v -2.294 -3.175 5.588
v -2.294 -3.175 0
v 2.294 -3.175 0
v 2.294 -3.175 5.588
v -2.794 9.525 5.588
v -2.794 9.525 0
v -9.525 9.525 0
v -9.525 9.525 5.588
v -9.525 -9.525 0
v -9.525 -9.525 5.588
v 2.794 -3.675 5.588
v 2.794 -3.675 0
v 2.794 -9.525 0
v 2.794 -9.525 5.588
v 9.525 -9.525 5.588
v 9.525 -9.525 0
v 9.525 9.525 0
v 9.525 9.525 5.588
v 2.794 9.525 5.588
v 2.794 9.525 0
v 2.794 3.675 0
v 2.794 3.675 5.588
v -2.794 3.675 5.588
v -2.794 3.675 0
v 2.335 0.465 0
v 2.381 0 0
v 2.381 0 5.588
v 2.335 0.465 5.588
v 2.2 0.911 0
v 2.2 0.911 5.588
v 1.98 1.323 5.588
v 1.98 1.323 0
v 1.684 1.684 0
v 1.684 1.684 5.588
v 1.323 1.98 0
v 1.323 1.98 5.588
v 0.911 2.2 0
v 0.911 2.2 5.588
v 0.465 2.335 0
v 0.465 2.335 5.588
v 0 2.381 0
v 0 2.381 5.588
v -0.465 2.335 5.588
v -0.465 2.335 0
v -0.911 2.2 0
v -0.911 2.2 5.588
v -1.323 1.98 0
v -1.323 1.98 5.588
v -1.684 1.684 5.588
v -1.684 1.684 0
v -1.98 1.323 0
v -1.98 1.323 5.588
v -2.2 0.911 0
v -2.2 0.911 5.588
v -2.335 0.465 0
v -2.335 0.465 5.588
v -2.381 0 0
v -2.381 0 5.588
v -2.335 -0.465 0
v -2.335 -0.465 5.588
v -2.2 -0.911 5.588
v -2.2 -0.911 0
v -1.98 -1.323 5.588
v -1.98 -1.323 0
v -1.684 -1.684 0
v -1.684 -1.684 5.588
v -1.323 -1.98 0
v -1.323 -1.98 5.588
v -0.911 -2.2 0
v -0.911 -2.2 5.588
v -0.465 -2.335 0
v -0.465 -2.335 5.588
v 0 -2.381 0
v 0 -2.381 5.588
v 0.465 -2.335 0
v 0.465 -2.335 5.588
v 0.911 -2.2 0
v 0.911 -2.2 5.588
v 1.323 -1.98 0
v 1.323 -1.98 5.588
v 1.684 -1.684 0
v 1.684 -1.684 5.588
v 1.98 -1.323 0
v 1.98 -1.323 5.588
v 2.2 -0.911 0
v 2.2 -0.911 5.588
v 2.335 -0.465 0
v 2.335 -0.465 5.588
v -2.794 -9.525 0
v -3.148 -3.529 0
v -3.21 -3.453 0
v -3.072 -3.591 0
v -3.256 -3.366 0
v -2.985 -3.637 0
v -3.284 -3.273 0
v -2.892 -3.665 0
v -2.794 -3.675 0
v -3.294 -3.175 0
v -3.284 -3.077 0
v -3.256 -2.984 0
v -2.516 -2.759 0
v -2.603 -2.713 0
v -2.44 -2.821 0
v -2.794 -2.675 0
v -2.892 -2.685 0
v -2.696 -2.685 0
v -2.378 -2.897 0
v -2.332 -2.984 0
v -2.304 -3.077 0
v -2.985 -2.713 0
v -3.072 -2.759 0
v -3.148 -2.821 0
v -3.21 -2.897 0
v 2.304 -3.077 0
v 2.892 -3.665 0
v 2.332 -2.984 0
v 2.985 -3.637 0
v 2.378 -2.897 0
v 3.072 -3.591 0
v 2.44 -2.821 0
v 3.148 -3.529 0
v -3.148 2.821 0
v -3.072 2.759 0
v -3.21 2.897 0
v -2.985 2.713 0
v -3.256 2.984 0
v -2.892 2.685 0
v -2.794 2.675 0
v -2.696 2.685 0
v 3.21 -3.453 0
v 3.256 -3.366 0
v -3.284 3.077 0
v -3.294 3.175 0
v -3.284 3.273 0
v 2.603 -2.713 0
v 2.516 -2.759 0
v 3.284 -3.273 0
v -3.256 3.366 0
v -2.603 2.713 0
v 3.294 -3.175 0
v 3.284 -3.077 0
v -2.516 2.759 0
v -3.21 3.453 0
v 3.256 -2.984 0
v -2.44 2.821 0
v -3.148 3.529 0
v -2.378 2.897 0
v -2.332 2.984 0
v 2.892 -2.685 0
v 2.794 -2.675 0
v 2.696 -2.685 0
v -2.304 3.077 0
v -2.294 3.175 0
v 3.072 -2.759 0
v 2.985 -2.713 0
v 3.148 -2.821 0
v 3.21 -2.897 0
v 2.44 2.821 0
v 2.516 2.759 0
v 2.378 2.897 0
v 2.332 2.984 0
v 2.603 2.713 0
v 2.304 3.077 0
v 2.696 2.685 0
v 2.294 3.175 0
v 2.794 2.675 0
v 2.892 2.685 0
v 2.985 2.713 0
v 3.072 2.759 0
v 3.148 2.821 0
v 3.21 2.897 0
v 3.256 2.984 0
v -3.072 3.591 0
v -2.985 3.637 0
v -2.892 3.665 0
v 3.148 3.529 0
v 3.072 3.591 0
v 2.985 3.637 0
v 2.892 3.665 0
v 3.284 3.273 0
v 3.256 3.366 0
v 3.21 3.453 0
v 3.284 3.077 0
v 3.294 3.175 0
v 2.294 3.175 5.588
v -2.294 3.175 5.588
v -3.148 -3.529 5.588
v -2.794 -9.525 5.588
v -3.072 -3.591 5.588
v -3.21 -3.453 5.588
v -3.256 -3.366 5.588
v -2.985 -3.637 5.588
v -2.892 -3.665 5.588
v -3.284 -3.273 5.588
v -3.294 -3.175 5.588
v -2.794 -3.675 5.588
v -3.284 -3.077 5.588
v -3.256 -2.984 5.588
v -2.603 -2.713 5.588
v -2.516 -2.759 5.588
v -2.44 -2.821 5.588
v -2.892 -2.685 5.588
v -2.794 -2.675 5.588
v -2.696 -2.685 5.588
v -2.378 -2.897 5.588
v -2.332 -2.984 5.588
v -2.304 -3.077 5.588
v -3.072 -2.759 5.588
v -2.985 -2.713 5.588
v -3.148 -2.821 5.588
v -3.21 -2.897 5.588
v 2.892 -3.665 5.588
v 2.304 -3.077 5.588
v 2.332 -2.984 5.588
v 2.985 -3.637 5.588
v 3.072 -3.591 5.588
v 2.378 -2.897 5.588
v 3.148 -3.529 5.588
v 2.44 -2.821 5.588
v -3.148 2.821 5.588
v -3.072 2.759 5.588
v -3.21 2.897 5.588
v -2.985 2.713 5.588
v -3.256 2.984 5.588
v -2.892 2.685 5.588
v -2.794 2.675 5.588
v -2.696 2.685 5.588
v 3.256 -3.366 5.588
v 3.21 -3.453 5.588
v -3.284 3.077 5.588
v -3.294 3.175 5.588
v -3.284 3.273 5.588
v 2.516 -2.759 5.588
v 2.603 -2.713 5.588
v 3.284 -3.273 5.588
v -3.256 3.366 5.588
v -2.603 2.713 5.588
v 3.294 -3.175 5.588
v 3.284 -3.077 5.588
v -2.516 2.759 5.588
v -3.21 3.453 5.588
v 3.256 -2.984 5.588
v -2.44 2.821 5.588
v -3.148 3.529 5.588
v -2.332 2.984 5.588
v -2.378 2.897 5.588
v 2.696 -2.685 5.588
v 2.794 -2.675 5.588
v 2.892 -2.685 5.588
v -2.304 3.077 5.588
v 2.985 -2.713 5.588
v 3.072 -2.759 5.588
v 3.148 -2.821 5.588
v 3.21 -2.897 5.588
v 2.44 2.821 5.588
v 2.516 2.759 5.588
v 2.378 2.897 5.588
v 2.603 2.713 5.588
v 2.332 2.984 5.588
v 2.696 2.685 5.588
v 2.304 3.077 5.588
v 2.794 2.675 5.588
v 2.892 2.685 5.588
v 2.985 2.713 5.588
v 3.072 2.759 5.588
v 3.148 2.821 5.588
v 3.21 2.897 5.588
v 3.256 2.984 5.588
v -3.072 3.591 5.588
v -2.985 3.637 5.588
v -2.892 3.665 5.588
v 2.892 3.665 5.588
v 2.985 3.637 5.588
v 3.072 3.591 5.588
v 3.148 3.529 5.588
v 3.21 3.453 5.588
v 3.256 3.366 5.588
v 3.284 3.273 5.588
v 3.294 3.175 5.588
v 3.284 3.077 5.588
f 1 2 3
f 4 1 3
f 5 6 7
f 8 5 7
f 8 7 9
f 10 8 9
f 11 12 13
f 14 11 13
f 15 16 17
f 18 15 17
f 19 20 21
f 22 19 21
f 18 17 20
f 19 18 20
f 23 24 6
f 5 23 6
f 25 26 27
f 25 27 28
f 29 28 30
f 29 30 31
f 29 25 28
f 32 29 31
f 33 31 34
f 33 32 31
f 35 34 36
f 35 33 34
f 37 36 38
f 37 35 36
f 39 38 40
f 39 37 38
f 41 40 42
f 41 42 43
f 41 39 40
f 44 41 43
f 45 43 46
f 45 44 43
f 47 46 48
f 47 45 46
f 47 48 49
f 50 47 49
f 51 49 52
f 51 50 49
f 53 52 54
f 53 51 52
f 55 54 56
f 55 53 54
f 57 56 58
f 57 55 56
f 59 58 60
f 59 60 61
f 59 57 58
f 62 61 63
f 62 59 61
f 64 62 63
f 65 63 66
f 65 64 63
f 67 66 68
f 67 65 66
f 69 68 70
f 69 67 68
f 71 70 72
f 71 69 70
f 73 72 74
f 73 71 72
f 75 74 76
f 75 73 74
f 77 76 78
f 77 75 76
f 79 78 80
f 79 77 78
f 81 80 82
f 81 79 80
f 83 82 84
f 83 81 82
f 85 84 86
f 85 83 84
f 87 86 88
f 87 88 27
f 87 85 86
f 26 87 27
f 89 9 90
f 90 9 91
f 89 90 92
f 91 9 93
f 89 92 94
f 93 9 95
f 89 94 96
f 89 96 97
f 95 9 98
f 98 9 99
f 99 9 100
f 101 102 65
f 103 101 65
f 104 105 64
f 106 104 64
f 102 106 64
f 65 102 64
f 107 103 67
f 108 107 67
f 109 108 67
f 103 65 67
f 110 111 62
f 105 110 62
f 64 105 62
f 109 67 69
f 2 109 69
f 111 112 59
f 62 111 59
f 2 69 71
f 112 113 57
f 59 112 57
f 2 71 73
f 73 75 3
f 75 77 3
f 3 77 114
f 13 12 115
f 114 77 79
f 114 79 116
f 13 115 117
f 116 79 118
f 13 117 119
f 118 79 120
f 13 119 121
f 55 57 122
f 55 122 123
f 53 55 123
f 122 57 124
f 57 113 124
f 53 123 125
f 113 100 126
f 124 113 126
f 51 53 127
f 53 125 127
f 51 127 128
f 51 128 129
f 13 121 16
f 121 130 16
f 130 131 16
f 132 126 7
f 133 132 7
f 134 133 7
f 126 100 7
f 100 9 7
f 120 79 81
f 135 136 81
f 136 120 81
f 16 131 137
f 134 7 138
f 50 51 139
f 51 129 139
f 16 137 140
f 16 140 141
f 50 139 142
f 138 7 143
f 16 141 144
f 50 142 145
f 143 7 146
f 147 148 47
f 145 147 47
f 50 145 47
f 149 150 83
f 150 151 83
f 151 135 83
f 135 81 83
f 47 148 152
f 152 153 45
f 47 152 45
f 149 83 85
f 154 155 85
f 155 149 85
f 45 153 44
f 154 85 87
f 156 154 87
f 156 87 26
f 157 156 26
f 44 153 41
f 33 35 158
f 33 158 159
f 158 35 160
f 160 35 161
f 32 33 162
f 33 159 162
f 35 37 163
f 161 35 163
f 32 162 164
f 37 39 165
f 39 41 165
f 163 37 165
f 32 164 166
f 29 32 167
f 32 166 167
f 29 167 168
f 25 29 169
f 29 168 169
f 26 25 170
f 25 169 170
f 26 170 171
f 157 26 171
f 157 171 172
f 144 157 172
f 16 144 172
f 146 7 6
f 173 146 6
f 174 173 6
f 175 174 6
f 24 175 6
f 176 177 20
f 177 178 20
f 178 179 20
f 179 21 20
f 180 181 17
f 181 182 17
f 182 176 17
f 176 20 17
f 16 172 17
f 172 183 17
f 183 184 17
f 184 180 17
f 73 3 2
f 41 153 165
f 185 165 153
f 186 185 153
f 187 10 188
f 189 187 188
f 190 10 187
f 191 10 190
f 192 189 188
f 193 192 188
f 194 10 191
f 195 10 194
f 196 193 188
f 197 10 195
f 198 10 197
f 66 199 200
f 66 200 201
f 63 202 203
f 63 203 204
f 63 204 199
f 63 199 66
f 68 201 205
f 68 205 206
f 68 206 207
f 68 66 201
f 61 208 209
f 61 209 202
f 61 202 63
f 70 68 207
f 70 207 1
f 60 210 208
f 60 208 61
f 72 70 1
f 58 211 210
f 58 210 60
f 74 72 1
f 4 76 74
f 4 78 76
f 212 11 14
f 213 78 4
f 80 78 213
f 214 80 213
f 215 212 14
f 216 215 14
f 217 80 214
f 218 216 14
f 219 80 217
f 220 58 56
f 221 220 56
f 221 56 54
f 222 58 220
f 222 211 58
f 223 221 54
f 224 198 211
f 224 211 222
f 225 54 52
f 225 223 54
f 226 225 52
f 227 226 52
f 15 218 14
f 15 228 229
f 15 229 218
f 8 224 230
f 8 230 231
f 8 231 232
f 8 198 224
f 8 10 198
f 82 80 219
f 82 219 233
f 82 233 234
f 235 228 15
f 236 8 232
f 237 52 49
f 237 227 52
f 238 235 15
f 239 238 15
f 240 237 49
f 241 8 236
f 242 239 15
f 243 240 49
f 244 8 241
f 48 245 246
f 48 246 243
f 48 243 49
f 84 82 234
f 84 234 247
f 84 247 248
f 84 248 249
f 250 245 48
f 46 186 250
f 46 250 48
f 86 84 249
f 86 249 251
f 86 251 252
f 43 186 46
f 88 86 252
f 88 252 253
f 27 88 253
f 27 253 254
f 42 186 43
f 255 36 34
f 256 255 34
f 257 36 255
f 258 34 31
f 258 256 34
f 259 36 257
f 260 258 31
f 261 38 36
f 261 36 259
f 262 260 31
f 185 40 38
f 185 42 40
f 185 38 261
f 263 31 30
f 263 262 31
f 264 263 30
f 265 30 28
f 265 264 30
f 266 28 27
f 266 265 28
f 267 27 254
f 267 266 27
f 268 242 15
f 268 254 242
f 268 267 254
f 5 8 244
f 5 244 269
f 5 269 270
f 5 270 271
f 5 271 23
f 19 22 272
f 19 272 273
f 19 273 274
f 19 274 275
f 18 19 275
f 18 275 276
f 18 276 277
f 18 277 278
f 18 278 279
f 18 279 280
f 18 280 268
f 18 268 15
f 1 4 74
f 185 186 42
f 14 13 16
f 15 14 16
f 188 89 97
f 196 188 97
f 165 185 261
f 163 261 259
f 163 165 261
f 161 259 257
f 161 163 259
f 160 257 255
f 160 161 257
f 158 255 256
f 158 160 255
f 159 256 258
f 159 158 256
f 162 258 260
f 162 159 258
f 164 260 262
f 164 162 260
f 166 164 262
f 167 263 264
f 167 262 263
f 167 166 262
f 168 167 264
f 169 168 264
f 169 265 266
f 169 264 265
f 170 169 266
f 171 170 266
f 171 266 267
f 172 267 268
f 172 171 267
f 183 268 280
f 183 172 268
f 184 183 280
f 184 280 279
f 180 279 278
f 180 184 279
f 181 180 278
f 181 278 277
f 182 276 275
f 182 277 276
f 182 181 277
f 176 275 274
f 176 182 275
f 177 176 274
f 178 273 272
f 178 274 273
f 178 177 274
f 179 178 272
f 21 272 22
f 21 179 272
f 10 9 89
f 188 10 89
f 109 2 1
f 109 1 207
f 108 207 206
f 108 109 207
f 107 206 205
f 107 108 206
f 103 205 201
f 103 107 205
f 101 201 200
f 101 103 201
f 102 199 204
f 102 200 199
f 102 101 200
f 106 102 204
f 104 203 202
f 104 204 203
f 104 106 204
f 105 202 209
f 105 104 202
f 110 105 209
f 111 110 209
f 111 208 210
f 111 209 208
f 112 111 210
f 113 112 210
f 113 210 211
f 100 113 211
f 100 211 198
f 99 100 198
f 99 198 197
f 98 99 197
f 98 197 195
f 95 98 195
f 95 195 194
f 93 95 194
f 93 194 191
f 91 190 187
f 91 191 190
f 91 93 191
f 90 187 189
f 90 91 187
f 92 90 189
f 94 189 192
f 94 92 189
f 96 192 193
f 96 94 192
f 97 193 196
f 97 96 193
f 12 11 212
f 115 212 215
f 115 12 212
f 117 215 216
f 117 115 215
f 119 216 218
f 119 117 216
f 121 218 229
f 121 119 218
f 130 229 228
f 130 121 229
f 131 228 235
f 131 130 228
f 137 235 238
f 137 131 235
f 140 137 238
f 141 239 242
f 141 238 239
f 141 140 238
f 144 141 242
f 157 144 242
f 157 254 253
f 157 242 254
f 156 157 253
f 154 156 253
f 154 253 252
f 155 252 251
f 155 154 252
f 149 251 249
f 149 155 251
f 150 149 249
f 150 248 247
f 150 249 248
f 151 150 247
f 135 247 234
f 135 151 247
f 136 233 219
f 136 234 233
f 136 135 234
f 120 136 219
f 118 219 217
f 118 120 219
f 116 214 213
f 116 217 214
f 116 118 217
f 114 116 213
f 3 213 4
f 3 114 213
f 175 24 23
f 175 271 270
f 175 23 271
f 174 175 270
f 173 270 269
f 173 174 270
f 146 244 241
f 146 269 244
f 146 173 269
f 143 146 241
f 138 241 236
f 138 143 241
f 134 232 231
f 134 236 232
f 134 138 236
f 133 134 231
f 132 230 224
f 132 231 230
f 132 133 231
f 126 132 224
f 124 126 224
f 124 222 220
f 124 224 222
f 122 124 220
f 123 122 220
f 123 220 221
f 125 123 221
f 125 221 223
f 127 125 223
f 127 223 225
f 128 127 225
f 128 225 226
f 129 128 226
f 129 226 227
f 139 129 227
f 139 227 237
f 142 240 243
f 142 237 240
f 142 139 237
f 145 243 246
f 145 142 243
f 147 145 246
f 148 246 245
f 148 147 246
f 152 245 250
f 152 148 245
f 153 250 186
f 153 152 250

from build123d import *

# Parameters (mm, degrees)
SKETCH1_R               = 2.38125
BOSS_EXTRUDE1_DEPTH     = 5.588
CUT_EXTRUDE2_DEPTH      = 15.583449318
CUT_EXTRUDE2_DEPTH_BACK = 15.583449318
SKETCH2_R               = 0.5


with BuildPart() as part:
    # Sketch1 → Boss-Extrude1 (new body)
    with BuildSketch(Plane.XY):
        Polygon((-2.794, 3.175), (-2.794, 9.525), (-9.525, 9.525), (-9.525, -9.525), (-2.794, -9.525), (-2.794, -3.175), (2.794, -3.175), (2.794, -9.525), (9.525, -9.525), (9.525, 9.525), (2.794, 9.525), (2.794, 3.175), align=None)
        Circle(SKETCH1_R, mode=Mode.SUBTRACT)
    extrude(amount=BOSS_EXTRUDE1_DEPTH)

    # Sketch2 → Cut-Extrude2 (cut, two sides: drawn at the far end of the back side and taken through both)
    with BuildSketch(Plane.XY.offset(-CUT_EXTRUDE2_DEPTH_BACK)):
        with Locations((-2.794, 3.175)):
            Circle(SKETCH2_R)
        with Locations((2.794, 3.175)):
            Circle(SKETCH2_R)
        with Locations((2.794, -3.175)):
            Circle(SKETCH2_R)
        with Locations((-2.794, -3.175)):
            Circle(SKETCH2_R)
    extrude(amount=CUT_EXTRUDE2_DEPTH + CUT_EXTRUDE2_DEPTH_BACK, mode=Mode.SUBTRACT)


solid = part.part
